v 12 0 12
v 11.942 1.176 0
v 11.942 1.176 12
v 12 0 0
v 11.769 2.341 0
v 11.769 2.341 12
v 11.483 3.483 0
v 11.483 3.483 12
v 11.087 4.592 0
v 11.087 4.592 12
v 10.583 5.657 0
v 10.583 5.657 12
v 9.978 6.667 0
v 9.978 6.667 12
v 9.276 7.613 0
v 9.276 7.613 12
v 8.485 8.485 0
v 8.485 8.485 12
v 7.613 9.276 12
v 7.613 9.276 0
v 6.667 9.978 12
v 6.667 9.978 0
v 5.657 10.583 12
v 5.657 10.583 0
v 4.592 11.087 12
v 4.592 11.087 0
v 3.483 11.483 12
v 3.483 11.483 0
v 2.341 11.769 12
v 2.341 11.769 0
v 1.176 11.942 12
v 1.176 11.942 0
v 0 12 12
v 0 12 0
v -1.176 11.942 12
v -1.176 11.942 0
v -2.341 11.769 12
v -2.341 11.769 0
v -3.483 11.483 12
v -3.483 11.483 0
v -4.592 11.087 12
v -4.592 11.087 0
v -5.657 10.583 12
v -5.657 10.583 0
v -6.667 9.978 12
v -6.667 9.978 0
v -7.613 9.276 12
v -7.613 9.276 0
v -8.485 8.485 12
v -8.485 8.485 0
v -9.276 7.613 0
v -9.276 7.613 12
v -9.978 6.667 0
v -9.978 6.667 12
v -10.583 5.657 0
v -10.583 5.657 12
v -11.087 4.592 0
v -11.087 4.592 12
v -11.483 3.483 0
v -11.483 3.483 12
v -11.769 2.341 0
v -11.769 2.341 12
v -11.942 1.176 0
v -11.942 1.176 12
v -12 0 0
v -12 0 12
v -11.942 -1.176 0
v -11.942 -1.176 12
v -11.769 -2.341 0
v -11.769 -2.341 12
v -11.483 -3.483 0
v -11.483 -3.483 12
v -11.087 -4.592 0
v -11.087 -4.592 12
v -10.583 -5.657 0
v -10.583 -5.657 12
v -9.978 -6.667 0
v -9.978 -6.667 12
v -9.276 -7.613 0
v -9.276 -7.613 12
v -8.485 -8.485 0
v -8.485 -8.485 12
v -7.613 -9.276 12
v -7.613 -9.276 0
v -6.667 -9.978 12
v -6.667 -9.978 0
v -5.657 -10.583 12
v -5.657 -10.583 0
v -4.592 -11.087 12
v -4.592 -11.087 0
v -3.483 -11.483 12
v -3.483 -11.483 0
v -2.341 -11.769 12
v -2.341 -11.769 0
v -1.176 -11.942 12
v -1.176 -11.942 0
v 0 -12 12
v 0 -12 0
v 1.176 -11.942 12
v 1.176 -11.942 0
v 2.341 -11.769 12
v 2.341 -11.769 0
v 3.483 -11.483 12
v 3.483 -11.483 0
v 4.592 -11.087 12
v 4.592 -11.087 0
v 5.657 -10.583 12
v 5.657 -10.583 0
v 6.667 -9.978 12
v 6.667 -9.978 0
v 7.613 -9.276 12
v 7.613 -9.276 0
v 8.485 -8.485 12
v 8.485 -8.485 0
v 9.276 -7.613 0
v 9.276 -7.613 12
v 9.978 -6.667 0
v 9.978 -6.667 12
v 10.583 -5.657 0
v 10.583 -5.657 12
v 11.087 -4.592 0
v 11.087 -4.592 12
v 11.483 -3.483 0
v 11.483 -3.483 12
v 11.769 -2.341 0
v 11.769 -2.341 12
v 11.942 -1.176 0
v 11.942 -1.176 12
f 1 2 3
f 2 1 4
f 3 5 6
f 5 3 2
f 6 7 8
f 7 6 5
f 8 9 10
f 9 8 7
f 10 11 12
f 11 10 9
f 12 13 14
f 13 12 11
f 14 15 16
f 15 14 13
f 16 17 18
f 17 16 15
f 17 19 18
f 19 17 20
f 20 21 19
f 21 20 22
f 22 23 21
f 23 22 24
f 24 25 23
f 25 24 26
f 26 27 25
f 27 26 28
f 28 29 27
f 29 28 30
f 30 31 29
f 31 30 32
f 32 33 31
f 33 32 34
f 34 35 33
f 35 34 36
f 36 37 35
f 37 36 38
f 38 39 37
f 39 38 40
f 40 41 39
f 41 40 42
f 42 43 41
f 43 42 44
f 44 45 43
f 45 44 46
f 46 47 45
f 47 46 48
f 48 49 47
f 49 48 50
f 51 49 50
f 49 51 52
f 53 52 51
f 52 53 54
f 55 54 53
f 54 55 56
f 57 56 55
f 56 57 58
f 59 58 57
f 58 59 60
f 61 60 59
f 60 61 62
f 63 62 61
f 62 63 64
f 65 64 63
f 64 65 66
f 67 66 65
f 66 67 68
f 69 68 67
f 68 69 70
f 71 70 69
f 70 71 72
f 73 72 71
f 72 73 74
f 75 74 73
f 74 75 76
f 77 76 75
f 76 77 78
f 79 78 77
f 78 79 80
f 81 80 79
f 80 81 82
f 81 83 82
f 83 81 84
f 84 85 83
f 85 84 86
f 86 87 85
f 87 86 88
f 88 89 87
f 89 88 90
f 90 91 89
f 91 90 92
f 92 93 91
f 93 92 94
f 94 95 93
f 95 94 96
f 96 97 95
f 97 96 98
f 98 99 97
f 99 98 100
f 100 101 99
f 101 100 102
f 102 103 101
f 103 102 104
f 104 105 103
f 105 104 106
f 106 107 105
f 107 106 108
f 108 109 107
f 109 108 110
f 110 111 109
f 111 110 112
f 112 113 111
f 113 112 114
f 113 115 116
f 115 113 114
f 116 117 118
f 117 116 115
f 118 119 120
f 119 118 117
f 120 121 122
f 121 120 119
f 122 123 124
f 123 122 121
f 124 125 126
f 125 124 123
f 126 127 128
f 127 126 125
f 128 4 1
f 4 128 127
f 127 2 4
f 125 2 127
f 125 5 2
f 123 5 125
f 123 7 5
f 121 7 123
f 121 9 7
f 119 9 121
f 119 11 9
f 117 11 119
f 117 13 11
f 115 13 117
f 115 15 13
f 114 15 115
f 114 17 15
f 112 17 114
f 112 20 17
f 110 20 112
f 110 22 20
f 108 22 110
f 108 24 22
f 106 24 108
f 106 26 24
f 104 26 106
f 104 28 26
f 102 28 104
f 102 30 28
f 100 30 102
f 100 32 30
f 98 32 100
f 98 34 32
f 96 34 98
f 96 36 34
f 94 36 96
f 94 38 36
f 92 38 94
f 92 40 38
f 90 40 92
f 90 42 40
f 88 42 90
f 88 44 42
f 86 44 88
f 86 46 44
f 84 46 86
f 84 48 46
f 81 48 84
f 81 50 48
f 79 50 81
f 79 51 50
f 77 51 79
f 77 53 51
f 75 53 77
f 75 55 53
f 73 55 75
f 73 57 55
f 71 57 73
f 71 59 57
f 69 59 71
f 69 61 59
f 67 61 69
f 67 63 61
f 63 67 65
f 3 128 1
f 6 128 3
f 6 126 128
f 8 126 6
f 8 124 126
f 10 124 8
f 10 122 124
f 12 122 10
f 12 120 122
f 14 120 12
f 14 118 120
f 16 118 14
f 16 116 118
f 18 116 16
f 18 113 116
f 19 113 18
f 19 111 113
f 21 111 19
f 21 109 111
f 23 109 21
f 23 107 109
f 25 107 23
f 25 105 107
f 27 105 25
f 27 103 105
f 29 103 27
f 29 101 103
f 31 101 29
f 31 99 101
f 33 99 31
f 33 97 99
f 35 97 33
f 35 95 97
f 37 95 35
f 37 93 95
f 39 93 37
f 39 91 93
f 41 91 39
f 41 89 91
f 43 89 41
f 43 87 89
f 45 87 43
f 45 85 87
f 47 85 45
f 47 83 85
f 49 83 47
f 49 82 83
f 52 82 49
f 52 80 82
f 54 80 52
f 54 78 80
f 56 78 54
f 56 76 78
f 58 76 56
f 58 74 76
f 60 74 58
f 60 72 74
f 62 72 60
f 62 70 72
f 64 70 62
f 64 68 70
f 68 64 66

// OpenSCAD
// Starter file for task-015.
// Edit this file in OpenSCAD to complete the requested hard task.
$fn = 64;

hub_d = 24;
hub_h = 12;
cylinder(d=hub_d, h=hub_h);
